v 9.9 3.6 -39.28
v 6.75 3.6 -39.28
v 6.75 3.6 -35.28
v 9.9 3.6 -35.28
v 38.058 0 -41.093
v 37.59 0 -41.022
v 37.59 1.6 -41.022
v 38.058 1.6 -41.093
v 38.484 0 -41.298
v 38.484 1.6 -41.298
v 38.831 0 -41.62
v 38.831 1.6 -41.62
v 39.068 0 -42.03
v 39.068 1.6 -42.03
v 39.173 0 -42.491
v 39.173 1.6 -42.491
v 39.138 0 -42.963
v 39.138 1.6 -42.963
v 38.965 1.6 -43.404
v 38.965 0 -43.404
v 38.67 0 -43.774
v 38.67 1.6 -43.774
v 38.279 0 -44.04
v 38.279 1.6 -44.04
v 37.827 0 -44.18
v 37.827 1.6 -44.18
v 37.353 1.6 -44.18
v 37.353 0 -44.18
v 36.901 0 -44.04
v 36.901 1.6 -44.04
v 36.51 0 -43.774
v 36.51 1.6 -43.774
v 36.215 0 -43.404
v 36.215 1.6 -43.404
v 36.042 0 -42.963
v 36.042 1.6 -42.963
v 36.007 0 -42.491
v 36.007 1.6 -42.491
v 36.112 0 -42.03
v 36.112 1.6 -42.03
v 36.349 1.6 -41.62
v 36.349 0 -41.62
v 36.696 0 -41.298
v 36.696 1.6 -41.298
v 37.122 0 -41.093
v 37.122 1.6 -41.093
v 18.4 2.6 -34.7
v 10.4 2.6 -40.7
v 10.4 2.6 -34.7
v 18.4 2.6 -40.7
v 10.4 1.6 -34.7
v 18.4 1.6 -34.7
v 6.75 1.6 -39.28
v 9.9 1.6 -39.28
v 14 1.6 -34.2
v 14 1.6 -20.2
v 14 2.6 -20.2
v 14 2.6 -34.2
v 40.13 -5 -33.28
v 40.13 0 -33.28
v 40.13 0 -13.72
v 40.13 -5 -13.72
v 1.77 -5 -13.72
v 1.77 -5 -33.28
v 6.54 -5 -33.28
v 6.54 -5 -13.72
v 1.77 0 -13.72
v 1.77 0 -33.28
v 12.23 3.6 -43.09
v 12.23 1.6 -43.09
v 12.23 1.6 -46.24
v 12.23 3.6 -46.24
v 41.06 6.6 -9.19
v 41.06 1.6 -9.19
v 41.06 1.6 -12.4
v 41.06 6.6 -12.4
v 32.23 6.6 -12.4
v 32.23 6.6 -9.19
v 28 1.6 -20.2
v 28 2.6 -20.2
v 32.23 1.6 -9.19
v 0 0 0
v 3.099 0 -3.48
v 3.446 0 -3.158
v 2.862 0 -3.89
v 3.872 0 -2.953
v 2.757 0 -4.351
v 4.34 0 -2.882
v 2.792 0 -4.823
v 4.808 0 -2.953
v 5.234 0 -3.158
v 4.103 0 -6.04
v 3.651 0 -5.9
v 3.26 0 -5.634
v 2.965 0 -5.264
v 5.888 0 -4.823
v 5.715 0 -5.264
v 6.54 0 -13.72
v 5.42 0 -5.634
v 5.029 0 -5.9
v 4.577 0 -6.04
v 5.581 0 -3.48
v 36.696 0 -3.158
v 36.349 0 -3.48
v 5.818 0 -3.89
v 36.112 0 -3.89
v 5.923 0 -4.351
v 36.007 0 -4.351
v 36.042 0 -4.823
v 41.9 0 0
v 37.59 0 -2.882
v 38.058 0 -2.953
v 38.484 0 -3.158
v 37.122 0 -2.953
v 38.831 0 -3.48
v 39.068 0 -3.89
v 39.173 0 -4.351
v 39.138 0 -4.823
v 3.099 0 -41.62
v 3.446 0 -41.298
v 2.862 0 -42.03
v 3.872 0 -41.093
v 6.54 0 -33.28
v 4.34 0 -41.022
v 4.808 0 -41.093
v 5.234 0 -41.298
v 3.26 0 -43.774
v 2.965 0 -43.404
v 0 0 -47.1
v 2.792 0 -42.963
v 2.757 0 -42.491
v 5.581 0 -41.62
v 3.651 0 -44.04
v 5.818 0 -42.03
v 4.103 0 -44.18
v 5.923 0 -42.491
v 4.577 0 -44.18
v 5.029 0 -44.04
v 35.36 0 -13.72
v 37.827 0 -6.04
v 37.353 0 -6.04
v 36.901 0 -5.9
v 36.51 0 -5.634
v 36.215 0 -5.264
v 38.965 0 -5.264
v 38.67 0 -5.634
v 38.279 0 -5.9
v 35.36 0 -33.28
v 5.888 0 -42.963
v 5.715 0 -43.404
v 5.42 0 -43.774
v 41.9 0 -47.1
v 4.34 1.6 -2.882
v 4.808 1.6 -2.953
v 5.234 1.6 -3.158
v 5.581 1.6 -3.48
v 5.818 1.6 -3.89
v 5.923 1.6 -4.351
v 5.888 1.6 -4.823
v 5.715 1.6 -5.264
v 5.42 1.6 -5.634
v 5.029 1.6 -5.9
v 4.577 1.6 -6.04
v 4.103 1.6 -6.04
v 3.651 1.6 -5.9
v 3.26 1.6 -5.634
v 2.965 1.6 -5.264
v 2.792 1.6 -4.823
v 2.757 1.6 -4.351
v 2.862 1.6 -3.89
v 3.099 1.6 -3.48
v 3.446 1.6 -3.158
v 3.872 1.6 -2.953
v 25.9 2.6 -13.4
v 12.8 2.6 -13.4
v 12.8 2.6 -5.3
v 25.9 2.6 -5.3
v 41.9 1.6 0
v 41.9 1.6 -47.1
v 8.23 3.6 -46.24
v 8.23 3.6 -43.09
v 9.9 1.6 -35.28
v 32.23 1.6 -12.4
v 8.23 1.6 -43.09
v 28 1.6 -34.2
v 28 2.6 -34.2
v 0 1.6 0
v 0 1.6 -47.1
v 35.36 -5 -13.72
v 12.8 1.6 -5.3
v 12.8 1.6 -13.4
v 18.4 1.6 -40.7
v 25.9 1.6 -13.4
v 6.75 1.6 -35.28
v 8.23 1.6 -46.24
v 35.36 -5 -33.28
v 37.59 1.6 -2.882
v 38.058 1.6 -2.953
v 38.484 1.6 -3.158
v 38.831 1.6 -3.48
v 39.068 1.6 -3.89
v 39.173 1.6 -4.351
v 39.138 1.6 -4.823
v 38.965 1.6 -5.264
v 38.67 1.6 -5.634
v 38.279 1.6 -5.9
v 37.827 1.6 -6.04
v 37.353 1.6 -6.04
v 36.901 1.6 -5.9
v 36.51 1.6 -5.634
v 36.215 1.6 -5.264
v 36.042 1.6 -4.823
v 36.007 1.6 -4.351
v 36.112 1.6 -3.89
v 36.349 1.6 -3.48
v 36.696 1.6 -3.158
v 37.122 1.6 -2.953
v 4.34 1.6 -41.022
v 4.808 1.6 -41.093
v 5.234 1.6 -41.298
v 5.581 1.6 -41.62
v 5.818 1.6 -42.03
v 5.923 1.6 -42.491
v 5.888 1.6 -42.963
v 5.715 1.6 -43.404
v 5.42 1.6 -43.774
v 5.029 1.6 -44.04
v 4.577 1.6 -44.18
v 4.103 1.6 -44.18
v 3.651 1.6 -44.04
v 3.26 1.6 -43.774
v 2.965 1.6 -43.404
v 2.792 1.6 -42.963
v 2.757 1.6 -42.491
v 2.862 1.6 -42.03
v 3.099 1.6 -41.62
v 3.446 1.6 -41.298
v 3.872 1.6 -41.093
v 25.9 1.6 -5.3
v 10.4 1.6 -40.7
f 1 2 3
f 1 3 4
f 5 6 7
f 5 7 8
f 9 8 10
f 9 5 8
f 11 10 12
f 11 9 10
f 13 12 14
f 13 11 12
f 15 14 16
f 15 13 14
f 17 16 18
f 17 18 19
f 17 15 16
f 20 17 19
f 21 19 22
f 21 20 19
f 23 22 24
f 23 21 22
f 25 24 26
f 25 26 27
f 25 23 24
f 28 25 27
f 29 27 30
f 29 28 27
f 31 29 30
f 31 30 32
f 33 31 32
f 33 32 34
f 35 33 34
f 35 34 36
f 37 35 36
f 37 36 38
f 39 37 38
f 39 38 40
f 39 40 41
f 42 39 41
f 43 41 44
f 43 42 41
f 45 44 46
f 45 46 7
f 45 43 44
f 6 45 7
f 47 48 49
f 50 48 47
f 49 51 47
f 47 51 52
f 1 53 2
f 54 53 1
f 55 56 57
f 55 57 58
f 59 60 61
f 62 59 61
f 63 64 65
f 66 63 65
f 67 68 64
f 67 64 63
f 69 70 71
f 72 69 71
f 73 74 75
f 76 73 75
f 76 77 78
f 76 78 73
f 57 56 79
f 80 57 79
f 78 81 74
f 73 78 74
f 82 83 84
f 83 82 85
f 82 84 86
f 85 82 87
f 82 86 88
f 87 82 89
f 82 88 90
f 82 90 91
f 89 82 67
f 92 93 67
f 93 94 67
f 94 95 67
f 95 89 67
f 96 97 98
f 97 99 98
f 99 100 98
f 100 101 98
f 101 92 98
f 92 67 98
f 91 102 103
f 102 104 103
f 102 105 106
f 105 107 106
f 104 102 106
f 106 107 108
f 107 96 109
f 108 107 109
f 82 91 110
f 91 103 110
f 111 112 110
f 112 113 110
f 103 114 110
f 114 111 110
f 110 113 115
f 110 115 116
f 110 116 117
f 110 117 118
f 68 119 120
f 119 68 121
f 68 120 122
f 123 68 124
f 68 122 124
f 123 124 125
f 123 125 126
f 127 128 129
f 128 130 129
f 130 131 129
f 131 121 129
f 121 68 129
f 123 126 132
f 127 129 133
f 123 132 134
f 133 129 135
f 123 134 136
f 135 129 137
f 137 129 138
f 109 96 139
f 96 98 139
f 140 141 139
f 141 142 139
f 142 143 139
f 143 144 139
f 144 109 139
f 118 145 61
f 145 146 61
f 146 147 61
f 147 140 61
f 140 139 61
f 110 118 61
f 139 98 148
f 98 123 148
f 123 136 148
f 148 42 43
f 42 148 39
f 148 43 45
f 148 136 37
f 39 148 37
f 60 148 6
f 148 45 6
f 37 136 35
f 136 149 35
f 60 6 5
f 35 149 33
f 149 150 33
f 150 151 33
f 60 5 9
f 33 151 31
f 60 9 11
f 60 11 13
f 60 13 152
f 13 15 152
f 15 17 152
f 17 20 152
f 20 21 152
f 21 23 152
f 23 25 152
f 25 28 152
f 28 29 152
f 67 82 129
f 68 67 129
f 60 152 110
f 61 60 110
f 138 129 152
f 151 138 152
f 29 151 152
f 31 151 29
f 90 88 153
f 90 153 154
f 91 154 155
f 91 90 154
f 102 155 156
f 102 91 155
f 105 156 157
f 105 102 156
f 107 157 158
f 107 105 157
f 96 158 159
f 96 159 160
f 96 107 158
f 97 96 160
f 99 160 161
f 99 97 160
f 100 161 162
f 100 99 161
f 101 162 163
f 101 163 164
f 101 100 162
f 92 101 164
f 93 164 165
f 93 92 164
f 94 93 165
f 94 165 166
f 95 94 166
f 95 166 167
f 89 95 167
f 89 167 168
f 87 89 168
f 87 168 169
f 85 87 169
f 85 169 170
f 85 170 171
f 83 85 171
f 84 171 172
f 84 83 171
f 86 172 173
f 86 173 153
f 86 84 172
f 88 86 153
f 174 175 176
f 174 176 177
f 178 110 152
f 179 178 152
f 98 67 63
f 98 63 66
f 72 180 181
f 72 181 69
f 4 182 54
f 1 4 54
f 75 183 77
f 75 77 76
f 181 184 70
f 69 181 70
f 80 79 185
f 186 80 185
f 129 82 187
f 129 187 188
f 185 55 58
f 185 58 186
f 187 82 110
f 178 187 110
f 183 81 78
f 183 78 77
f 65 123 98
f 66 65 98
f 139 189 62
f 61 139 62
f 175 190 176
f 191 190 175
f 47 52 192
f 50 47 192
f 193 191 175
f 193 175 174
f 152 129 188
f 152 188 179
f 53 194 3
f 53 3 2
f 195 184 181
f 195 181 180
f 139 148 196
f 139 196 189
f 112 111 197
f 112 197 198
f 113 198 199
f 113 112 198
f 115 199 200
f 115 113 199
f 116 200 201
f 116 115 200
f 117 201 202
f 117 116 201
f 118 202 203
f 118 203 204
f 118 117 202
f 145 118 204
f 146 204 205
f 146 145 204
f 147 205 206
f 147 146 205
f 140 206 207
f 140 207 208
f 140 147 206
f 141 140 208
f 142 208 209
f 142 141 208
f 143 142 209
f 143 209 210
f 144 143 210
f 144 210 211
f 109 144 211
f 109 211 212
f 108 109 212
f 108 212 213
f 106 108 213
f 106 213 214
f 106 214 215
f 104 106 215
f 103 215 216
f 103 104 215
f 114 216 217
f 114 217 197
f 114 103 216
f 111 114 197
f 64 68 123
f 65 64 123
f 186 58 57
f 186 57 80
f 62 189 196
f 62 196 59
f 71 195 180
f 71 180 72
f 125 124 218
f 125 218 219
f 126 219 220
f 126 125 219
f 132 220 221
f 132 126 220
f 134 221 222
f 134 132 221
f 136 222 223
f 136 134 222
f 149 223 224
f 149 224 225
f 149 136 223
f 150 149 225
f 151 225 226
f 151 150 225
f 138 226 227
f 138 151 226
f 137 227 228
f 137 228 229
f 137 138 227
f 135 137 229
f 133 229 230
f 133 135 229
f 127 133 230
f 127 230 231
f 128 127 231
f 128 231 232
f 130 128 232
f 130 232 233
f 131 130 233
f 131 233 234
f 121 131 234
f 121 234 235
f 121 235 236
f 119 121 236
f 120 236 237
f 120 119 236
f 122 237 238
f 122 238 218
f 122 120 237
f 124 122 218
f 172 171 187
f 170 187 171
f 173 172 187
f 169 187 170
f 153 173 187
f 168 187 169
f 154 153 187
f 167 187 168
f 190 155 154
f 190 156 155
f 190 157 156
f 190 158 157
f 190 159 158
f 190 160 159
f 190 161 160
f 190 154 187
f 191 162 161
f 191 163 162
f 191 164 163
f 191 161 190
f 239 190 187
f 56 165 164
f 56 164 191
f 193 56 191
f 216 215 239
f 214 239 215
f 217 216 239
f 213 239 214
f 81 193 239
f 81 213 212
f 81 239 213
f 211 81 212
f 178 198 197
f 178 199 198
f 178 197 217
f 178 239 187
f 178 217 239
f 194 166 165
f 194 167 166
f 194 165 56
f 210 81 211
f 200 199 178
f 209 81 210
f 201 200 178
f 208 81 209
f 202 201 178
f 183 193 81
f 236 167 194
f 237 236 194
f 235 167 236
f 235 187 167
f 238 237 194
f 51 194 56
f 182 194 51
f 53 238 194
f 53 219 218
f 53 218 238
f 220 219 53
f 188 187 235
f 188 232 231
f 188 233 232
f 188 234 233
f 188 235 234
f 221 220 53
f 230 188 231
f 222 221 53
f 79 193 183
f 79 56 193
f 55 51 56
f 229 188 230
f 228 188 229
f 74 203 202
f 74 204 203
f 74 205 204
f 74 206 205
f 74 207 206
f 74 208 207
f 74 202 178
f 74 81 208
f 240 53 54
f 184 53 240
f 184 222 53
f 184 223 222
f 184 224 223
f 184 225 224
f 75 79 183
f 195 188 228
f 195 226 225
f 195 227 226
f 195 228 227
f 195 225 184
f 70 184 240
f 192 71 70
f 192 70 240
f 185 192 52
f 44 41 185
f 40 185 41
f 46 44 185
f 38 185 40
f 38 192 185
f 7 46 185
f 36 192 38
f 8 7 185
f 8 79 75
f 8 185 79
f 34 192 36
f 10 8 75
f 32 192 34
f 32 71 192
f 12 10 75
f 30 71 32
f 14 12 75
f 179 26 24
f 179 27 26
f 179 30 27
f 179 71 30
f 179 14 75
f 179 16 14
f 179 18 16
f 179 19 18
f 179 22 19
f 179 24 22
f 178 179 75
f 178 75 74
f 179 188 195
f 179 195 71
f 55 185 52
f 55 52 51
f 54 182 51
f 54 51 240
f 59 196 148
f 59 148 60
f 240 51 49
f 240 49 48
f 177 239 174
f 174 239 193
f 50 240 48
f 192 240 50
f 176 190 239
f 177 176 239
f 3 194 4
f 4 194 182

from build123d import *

# Parameters (mm, degrees)
SKETCH_1_W      = 41.9
SKETCH_1_H      = 47.1
SKETCH_1_R      = 1.5875
EXTRUDE_1_DEPTH = 1.6
SKETCH_2_W      = 3.15
SKETCH_2_H      = 4
SKETCH_2_W_2    = 4
SKETCH_2_H_2    = 3.15
EXTRUDE_2_DEPTH = 2
SKETCH_3_W      = 8.83
SKETCH_3_H      = 3.21
EXTRUDE_3_DEPTH = 5
SKETCH_4_W      = 4.77
SKETCH_4_H      = 19.56
EXTRUDE_4_DEPTH = 5
SKETCH_5_W      = 14
SKETCH_5_H      = 14
SKETCH_5_W_2    = 13.1
SKETCH_5_H_2    = 8.1
SKETCH_5_W_3    = 8
SKETCH_5_H_3    = 6
EXTRUDE_5_DEPTH = 1


with BuildPart() as part:
    # 草图1 → 凸台-拉伸1 (new body)
    with BuildSketch(Plane(origin=(0, 0, 0), x_dir=(1, 0, 0), z_dir=(0, 1, 0))):
        with Locations((20.95, 23.55)):
            Rectangle(SKETCH_1_W, SKETCH_1_H)
        with Locations(Location((4.34, 42.61, 0), (0, 0, 270))):
            Circle(SKETCH_1_R, mode=Mode.SUBTRACT)
        with Locations(Location((37.59, 42.61, 0), (0, 0, 270))):
            Circle(SKETCH_1_R, mode=Mode.SUBTRACT)
        with Locations(Location((37.59, 4.47, 0), (0, 0, 270))):
            Circle(SKETCH_1_R, mode=Mode.SUBTRACT)
        with Locations(Location((4.34, 4.47, 0), (0, 0, 270))):
            Circle(SKETCH_1_R, mode=Mode.SUBTRACT)
    extrude(amount=EXTRUDE_1_DEPTH)

    # 草图2 → 凸台-拉伸2 (add)
    with BuildSketch(Plane(origin=(0, 1.6, 0), x_dir=(1, 0, 0), z_dir=(0, 1, 0))):
        with Locations((8.325, 37.28)):
            Rectangle(SKETCH_2_W, SKETCH_2_H)
        with Locations((10.23, 44.665)):
            Rectangle(SKETCH_2_W_2, SKETCH_2_H_2)
    extrude(amount=EXTRUDE_2_DEPTH)

    # 草图3 → 凸台-拉伸3 (add)
    with BuildSketch(Plane(origin=(0, 1.6, 0), x_dir=(1, 0, 0), z_dir=(0, 1, 0))):
        with Locations((36.645, 10.795)):
            Rectangle(SKETCH_3_W, SKETCH_3_H)
    extrude(amount=EXTRUDE_3_DEPTH)

    # 草图4 → 凸台-拉伸4 (add)
    with BuildSketch(Plane.XZ):
        with Locations((4.155, -23.5)):
            Rectangle(SKETCH_4_W, SKETCH_4_H)
        with Locations((37.745, -23.5)):
            Rectangle(SKETCH_4_W, SKETCH_4_H)
    extrude(amount=EXTRUDE_4_DEPTH)

    # 草图5 → 凸台-拉伸5 (add)
    with BuildSketch(Plane(origin=(0, 1.6, 0), x_dir=(1, 0, 0), z_dir=(0, 1, 0))):
        with Locations((21, 27.2)):
            Rectangle(SKETCH_5_W, SKETCH_5_H)
        with Locations((19.35, 9.35)):
            Rectangle(SKETCH_5_W_2, SKETCH_5_H_2)
        with Locations((14.4, 37.7)):
            Rectangle(SKETCH_5_W_3, SKETCH_5_H_3)
    extrude(amount=EXTRUDE_5_DEPTH)


solid = part.part
